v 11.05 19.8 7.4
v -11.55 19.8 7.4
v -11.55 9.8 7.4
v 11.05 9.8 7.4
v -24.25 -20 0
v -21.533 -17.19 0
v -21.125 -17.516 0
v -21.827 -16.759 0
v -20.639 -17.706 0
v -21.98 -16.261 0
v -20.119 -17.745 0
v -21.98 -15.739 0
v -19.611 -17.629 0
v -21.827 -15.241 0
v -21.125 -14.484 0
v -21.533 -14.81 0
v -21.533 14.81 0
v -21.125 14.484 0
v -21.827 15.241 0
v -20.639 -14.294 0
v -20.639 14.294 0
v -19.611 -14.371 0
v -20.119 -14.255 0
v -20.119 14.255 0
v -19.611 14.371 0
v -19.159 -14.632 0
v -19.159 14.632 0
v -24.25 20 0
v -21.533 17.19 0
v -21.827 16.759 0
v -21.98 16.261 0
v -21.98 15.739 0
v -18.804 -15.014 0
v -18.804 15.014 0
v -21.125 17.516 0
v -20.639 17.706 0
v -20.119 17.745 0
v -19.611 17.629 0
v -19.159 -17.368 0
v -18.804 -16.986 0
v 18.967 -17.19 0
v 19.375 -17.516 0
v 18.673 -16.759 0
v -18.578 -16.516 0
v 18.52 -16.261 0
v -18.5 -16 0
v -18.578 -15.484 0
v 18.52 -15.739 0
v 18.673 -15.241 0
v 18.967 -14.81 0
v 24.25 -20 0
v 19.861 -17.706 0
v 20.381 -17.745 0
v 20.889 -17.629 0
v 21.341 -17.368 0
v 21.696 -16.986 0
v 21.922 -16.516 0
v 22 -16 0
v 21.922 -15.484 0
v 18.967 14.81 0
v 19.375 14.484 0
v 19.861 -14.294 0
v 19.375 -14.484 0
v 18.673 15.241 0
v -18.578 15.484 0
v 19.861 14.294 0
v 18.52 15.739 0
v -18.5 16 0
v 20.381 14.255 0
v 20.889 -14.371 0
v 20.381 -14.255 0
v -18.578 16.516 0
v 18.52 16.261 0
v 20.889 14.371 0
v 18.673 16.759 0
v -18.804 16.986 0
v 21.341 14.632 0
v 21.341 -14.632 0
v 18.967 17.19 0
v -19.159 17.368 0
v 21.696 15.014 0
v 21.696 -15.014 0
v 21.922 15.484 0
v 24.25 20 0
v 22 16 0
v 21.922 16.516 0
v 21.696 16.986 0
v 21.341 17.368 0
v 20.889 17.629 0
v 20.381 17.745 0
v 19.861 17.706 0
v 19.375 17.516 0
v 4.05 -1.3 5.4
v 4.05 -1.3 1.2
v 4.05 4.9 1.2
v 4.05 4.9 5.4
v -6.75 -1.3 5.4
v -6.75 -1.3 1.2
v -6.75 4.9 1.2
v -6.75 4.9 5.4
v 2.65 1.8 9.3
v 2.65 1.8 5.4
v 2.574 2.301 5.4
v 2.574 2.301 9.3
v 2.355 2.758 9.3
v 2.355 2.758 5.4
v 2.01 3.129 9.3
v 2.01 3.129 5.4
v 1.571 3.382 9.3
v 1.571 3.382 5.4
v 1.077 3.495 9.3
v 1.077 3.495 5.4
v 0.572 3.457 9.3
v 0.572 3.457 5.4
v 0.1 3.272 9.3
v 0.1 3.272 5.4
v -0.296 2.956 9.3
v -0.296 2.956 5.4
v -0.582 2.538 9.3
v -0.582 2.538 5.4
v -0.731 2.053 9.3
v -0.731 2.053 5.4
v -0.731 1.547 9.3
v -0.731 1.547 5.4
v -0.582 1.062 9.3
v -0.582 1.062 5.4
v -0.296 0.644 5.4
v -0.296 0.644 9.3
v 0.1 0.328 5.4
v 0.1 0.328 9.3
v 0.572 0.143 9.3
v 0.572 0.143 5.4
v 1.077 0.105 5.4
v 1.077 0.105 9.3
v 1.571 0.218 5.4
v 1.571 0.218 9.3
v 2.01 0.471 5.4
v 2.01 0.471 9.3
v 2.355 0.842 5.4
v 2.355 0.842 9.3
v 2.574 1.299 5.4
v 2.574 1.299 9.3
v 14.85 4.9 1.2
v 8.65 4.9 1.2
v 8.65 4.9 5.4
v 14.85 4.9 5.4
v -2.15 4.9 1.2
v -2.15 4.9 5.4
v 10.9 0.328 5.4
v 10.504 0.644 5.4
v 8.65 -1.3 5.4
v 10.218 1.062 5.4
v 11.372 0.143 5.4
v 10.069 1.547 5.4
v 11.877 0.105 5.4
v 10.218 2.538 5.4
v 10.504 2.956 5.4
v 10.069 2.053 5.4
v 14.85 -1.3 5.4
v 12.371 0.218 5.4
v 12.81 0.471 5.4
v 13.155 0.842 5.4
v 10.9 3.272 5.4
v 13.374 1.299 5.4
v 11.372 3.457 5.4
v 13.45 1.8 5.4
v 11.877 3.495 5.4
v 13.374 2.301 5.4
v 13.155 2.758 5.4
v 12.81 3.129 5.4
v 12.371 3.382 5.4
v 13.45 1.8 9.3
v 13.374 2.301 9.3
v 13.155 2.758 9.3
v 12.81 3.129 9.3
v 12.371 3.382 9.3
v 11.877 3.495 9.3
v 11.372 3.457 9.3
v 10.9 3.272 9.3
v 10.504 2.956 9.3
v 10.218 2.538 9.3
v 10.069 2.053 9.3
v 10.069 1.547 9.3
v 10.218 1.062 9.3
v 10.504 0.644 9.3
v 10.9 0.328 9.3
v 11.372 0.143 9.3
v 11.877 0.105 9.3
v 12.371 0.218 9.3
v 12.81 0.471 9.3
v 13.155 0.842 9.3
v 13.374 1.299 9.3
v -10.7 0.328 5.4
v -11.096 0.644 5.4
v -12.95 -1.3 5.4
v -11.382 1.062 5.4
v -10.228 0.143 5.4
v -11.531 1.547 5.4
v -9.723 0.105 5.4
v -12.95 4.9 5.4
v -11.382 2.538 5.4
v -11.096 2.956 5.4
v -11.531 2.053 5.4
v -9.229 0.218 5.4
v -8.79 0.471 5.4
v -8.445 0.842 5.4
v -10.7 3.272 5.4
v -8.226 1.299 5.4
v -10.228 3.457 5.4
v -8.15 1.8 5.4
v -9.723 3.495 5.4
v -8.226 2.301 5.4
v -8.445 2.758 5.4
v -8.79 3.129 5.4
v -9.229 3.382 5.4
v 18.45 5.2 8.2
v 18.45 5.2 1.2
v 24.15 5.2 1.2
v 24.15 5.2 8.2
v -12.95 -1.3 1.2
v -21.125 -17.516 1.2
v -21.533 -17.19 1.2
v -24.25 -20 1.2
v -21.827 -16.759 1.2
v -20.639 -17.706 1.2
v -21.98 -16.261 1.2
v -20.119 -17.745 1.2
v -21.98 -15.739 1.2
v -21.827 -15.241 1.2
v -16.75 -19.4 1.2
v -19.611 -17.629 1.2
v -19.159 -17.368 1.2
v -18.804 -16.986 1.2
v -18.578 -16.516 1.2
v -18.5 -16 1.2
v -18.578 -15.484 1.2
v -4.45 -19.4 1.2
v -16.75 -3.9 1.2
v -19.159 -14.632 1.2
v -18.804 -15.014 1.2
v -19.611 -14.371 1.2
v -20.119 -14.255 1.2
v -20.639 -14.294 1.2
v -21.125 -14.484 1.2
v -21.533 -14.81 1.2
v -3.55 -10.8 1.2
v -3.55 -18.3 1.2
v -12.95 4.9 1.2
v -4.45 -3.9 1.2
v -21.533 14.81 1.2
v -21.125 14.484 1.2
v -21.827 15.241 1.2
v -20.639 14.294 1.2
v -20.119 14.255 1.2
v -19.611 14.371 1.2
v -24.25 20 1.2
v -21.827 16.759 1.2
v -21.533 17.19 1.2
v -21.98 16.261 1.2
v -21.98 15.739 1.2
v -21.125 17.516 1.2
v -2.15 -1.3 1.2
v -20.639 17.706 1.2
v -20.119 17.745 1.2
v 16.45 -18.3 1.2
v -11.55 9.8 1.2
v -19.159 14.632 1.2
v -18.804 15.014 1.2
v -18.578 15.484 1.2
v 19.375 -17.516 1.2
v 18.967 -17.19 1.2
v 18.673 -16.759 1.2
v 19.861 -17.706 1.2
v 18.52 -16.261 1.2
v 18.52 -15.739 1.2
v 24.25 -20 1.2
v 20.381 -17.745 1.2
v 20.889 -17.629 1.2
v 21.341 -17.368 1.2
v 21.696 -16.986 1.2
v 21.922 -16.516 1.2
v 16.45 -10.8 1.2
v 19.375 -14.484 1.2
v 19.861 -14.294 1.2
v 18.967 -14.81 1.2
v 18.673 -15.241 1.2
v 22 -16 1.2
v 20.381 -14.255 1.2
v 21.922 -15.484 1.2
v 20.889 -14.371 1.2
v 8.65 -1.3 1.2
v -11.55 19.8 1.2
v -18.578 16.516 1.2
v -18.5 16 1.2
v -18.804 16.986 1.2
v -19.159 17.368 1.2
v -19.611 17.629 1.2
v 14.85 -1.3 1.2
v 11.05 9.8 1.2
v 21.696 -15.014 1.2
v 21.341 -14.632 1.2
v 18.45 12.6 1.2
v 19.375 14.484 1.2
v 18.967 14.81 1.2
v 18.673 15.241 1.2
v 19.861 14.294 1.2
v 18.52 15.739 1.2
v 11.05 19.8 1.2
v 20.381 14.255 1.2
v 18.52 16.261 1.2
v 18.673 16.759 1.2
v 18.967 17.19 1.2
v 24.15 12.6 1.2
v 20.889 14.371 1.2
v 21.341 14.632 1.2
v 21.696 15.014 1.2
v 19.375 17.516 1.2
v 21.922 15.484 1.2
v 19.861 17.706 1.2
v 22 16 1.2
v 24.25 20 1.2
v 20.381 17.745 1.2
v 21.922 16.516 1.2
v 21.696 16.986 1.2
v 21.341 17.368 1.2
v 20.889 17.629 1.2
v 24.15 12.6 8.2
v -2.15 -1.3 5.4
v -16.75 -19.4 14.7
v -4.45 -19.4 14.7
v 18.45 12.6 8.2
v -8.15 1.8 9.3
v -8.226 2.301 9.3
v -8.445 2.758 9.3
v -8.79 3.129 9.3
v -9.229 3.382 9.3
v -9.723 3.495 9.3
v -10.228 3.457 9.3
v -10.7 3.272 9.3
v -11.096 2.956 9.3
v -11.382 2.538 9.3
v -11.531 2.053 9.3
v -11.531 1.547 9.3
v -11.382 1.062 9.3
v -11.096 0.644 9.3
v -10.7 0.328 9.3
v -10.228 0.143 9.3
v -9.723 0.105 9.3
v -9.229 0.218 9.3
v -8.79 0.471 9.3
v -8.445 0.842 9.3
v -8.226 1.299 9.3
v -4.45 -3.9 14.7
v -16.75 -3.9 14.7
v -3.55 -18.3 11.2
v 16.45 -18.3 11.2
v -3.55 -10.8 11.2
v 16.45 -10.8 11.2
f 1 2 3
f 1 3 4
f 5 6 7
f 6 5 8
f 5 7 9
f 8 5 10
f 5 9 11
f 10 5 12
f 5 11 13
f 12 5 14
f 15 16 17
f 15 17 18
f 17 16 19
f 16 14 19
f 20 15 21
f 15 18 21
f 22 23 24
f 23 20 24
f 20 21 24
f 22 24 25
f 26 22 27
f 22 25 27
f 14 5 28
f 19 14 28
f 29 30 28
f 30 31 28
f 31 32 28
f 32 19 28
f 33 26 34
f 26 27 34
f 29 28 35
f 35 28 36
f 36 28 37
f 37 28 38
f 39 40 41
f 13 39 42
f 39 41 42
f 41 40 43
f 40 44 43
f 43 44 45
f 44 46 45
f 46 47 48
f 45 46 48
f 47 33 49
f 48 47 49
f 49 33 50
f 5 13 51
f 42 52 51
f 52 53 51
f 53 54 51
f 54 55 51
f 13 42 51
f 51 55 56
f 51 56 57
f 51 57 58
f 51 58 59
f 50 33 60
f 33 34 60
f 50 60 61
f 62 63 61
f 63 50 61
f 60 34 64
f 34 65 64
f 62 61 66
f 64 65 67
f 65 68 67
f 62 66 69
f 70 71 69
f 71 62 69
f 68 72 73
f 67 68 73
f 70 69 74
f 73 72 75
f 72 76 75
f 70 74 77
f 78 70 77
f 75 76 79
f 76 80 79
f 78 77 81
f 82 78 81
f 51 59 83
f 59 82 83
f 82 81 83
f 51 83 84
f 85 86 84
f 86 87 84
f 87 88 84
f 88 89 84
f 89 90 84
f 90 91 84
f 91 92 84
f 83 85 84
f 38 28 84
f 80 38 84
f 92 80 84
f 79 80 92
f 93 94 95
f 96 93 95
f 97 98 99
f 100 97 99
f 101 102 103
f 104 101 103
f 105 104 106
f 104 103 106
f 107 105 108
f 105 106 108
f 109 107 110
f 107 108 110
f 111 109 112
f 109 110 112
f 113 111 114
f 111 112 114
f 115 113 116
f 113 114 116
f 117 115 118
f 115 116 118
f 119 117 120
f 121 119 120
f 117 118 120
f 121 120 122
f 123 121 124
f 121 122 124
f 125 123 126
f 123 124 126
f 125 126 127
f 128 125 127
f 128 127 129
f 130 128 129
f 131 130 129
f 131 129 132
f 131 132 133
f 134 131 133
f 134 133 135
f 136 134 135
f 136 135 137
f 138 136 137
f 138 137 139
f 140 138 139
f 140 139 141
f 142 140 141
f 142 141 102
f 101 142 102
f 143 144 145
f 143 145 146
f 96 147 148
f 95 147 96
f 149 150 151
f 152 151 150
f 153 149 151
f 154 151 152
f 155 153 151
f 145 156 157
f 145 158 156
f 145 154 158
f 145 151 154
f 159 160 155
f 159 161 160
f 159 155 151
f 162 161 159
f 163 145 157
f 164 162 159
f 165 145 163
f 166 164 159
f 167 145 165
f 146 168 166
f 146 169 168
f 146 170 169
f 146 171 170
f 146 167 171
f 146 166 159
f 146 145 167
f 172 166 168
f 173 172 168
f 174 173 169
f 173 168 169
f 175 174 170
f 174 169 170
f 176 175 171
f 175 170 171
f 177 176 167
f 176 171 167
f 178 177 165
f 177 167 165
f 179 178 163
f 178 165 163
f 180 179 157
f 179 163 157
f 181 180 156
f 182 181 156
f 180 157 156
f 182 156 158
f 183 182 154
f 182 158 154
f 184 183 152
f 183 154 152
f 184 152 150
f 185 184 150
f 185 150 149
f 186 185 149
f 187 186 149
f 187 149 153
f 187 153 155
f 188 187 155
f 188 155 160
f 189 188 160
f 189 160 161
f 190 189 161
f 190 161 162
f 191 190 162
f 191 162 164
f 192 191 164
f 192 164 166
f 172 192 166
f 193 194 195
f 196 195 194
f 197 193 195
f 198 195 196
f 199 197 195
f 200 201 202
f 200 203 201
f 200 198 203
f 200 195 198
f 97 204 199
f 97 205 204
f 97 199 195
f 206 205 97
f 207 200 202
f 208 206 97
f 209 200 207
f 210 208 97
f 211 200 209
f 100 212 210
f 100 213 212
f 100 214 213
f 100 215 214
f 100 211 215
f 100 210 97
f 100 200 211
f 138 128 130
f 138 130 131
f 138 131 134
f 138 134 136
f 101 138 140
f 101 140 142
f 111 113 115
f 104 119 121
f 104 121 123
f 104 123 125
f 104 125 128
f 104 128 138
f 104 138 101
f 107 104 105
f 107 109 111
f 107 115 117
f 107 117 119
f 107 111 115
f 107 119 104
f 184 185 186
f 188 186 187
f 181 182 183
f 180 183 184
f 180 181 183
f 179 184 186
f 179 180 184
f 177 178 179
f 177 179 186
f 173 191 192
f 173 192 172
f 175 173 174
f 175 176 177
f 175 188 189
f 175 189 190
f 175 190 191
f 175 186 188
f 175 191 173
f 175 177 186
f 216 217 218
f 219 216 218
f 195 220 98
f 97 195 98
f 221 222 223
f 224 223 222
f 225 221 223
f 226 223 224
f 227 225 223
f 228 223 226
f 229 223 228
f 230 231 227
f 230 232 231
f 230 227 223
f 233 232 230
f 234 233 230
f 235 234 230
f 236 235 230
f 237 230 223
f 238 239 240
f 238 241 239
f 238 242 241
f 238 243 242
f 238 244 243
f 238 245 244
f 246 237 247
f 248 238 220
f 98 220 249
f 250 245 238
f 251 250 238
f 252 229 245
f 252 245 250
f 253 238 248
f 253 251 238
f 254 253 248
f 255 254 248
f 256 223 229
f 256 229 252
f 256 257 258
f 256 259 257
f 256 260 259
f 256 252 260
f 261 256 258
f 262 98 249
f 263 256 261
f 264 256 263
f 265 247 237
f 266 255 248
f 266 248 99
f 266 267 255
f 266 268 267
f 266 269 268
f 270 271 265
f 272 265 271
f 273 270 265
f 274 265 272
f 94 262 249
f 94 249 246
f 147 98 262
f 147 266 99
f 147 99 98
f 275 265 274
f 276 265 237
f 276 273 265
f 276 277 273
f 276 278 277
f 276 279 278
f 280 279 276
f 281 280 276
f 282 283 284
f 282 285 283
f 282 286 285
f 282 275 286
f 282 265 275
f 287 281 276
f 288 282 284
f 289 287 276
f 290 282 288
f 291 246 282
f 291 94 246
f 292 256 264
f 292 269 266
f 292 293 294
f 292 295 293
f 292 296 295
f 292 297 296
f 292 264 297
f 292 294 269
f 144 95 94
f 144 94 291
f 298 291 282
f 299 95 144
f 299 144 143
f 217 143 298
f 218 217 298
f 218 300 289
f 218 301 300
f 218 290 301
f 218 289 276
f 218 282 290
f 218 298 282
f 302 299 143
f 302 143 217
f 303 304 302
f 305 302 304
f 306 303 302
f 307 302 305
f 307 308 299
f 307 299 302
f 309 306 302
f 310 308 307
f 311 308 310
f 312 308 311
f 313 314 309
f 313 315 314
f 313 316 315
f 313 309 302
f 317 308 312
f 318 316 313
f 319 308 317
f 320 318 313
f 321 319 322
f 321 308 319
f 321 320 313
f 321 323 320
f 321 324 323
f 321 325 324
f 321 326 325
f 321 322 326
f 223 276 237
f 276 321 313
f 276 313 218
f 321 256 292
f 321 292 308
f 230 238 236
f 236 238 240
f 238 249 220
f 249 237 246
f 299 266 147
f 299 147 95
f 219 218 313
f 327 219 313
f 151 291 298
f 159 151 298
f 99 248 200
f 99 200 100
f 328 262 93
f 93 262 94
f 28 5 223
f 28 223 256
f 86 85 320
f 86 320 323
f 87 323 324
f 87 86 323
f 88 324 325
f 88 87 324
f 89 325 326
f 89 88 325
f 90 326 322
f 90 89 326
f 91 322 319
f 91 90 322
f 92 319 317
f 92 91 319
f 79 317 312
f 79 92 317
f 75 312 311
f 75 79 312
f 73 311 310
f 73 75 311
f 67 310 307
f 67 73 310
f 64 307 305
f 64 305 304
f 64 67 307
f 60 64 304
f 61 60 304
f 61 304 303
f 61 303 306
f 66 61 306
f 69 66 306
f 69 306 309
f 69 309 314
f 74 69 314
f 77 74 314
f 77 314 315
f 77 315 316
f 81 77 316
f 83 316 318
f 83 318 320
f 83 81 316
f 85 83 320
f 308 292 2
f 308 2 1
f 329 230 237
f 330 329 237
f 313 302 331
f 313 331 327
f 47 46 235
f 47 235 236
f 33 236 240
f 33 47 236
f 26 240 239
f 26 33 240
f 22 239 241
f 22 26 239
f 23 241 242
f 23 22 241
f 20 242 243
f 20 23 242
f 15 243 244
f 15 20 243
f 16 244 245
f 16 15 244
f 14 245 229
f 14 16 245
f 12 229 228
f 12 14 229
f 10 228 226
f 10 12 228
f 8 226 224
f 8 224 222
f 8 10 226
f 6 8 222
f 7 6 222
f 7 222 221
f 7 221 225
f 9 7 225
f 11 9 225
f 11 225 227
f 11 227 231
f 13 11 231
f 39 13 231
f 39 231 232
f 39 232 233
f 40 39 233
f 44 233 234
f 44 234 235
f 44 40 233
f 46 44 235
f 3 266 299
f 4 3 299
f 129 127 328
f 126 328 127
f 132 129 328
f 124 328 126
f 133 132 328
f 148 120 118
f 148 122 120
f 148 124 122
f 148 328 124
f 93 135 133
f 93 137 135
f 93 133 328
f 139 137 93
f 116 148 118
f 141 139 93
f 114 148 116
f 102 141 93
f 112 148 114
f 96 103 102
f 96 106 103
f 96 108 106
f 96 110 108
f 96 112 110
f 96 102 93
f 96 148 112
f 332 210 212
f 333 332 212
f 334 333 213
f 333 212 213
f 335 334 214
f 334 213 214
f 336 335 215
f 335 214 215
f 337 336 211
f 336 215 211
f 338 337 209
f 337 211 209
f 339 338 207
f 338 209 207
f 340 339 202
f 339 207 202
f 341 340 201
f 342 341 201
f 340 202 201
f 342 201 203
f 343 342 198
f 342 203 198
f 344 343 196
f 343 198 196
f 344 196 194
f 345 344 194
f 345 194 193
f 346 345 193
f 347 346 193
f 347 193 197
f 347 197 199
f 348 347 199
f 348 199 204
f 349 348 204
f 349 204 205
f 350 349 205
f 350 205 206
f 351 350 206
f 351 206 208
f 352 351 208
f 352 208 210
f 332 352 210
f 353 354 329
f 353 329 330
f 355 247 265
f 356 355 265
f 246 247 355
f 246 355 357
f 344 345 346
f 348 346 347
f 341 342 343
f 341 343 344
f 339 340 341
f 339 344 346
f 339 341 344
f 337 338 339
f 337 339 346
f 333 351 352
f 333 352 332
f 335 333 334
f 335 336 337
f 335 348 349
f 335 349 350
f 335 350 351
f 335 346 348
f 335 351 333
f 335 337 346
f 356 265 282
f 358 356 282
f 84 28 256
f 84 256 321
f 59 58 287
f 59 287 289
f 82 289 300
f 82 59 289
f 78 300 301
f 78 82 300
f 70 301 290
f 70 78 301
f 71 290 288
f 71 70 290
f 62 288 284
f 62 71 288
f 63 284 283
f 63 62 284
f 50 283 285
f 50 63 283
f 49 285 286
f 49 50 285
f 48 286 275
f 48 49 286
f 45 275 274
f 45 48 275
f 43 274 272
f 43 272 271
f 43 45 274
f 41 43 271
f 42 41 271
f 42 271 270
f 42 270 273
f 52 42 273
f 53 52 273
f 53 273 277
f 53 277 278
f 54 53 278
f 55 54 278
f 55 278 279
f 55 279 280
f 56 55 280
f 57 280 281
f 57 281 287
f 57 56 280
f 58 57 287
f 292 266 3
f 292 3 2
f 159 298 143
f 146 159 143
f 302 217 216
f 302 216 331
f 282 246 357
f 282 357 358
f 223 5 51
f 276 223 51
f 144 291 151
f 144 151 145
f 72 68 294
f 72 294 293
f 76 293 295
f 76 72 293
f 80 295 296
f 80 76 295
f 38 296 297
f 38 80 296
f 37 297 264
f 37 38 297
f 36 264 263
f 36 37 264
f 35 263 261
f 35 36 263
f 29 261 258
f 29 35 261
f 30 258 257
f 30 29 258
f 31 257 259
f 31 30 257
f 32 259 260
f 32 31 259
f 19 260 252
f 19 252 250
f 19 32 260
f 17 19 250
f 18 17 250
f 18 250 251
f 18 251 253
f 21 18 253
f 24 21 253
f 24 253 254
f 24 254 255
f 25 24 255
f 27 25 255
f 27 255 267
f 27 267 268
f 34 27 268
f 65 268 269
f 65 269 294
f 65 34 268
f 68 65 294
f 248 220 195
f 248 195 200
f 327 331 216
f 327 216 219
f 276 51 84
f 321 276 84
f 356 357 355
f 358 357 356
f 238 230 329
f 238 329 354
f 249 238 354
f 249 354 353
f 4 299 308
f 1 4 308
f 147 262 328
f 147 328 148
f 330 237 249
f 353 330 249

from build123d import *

# Parameters (mm, degrees)
F0_W      = 48.5
F0_H      = 40
F0_R      = 1.75
F1_DEPTH  = 1.2
F2_W      = 22.6
F2_H      = 10
F3_DEPTH  = 6.2
F4_W      = 5.7
F4_H      = 7.4
F5_DEPTH  = 7
F6_W      = 20
F6_H      = 7.5
F7_DEPTH  = 10
F8_W      = 12.3
F8_H      = 15.5
F9_DEPTH  = 13.5
F10_W     = 6.2
F10_H     = 6.2
F10_R     = 1.7
F11_DEPTH = 4.2
F12_DEPTH = 8.1


with BuildPart() as f1:
    # F0 (on Top) → F1 (new body)
    with BuildSketch(Plane.XY):
        Rectangle(F0_W, F0_H)
        with Locations((-20.25, -16)):
            Circle(F0_R, mode=Mode.SUBTRACT)
        with Locations((20.25, -16)):
            Circle(F0_R, mode=Mode.SUBTRACT)
        with Locations((-20.25, 16)):
            Circle(F0_R, mode=Mode.SUBTRACT)
        with Locations((20.25, 16)):
            Circle(F0_R, mode=Mode.SUBTRACT)
    extrude(amount=F1_DEPTH)

    # F2 (on face) → F3 (join)
    with BuildSketch(Plane.XY.offset(1.2)):
        with Locations((-0.25, 14.8)):
            Rectangle(F2_W, F2_H)
    extrude(amount=F3_DEPTH)

    # F4 (on face) → F5 (join)
    with BuildSketch(Plane.XY.offset(1.2)):
        with Locations((21.3, 8.9)):
            Rectangle(F4_W, F4_H)
    extrude(amount=F5_DEPTH)

    # F6 (on face) → F7 (join)
    with BuildSketch(Plane.XY.offset(1.2)):
        with Locations((6.45, -14.55)):
            Rectangle(F6_W, F6_H)
    extrude(amount=F7_DEPTH)

    # F8 (on face) → F9 (join)
    with BuildSketch(Plane.XY.offset(1.2)):
        with Locations((-10.6, -11.65)):
            Rectangle(F8_W, F8_H)
    extrude(amount=F9_DEPTH)

    # F10 (on face) → F11 (join)
    with BuildSketch(Plane.XY.offset(1.2)):
        with Locations((11.75, 1.8)):
            Rectangle(F10_W, F10_H)
        with Locations((11.75, 1.8)):
            Circle(F10_R, mode=Mode.SUBTRACT)
        with Locations((0.95, 1.8)):
            Rectangle(F10_W, F10_H)
        with Locations((0.95, 1.8)):
            Circle(F10_R, mode=Mode.SUBTRACT)
        with Locations((-9.85, 1.8)):
            Rectangle(F10_W, F10_H)
        with Locations((-9.85, 1.8)):
            Circle(F10_R, mode=Mode.SUBTRACT)
    extrude(amount=F11_DEPTH)

    # F12 (add): faces of the model
    f12_faces = [f1.faces().sort_by_distance(p)[0] for p in [
        (-9.85, 1.8, 1.2),
        (0.95, 1.8, 1.2),
        (11.75, 1.8, 1.2),
    ]]
    extrude(f12_faces, amount=F12_DEPTH)


solid = f1.part
